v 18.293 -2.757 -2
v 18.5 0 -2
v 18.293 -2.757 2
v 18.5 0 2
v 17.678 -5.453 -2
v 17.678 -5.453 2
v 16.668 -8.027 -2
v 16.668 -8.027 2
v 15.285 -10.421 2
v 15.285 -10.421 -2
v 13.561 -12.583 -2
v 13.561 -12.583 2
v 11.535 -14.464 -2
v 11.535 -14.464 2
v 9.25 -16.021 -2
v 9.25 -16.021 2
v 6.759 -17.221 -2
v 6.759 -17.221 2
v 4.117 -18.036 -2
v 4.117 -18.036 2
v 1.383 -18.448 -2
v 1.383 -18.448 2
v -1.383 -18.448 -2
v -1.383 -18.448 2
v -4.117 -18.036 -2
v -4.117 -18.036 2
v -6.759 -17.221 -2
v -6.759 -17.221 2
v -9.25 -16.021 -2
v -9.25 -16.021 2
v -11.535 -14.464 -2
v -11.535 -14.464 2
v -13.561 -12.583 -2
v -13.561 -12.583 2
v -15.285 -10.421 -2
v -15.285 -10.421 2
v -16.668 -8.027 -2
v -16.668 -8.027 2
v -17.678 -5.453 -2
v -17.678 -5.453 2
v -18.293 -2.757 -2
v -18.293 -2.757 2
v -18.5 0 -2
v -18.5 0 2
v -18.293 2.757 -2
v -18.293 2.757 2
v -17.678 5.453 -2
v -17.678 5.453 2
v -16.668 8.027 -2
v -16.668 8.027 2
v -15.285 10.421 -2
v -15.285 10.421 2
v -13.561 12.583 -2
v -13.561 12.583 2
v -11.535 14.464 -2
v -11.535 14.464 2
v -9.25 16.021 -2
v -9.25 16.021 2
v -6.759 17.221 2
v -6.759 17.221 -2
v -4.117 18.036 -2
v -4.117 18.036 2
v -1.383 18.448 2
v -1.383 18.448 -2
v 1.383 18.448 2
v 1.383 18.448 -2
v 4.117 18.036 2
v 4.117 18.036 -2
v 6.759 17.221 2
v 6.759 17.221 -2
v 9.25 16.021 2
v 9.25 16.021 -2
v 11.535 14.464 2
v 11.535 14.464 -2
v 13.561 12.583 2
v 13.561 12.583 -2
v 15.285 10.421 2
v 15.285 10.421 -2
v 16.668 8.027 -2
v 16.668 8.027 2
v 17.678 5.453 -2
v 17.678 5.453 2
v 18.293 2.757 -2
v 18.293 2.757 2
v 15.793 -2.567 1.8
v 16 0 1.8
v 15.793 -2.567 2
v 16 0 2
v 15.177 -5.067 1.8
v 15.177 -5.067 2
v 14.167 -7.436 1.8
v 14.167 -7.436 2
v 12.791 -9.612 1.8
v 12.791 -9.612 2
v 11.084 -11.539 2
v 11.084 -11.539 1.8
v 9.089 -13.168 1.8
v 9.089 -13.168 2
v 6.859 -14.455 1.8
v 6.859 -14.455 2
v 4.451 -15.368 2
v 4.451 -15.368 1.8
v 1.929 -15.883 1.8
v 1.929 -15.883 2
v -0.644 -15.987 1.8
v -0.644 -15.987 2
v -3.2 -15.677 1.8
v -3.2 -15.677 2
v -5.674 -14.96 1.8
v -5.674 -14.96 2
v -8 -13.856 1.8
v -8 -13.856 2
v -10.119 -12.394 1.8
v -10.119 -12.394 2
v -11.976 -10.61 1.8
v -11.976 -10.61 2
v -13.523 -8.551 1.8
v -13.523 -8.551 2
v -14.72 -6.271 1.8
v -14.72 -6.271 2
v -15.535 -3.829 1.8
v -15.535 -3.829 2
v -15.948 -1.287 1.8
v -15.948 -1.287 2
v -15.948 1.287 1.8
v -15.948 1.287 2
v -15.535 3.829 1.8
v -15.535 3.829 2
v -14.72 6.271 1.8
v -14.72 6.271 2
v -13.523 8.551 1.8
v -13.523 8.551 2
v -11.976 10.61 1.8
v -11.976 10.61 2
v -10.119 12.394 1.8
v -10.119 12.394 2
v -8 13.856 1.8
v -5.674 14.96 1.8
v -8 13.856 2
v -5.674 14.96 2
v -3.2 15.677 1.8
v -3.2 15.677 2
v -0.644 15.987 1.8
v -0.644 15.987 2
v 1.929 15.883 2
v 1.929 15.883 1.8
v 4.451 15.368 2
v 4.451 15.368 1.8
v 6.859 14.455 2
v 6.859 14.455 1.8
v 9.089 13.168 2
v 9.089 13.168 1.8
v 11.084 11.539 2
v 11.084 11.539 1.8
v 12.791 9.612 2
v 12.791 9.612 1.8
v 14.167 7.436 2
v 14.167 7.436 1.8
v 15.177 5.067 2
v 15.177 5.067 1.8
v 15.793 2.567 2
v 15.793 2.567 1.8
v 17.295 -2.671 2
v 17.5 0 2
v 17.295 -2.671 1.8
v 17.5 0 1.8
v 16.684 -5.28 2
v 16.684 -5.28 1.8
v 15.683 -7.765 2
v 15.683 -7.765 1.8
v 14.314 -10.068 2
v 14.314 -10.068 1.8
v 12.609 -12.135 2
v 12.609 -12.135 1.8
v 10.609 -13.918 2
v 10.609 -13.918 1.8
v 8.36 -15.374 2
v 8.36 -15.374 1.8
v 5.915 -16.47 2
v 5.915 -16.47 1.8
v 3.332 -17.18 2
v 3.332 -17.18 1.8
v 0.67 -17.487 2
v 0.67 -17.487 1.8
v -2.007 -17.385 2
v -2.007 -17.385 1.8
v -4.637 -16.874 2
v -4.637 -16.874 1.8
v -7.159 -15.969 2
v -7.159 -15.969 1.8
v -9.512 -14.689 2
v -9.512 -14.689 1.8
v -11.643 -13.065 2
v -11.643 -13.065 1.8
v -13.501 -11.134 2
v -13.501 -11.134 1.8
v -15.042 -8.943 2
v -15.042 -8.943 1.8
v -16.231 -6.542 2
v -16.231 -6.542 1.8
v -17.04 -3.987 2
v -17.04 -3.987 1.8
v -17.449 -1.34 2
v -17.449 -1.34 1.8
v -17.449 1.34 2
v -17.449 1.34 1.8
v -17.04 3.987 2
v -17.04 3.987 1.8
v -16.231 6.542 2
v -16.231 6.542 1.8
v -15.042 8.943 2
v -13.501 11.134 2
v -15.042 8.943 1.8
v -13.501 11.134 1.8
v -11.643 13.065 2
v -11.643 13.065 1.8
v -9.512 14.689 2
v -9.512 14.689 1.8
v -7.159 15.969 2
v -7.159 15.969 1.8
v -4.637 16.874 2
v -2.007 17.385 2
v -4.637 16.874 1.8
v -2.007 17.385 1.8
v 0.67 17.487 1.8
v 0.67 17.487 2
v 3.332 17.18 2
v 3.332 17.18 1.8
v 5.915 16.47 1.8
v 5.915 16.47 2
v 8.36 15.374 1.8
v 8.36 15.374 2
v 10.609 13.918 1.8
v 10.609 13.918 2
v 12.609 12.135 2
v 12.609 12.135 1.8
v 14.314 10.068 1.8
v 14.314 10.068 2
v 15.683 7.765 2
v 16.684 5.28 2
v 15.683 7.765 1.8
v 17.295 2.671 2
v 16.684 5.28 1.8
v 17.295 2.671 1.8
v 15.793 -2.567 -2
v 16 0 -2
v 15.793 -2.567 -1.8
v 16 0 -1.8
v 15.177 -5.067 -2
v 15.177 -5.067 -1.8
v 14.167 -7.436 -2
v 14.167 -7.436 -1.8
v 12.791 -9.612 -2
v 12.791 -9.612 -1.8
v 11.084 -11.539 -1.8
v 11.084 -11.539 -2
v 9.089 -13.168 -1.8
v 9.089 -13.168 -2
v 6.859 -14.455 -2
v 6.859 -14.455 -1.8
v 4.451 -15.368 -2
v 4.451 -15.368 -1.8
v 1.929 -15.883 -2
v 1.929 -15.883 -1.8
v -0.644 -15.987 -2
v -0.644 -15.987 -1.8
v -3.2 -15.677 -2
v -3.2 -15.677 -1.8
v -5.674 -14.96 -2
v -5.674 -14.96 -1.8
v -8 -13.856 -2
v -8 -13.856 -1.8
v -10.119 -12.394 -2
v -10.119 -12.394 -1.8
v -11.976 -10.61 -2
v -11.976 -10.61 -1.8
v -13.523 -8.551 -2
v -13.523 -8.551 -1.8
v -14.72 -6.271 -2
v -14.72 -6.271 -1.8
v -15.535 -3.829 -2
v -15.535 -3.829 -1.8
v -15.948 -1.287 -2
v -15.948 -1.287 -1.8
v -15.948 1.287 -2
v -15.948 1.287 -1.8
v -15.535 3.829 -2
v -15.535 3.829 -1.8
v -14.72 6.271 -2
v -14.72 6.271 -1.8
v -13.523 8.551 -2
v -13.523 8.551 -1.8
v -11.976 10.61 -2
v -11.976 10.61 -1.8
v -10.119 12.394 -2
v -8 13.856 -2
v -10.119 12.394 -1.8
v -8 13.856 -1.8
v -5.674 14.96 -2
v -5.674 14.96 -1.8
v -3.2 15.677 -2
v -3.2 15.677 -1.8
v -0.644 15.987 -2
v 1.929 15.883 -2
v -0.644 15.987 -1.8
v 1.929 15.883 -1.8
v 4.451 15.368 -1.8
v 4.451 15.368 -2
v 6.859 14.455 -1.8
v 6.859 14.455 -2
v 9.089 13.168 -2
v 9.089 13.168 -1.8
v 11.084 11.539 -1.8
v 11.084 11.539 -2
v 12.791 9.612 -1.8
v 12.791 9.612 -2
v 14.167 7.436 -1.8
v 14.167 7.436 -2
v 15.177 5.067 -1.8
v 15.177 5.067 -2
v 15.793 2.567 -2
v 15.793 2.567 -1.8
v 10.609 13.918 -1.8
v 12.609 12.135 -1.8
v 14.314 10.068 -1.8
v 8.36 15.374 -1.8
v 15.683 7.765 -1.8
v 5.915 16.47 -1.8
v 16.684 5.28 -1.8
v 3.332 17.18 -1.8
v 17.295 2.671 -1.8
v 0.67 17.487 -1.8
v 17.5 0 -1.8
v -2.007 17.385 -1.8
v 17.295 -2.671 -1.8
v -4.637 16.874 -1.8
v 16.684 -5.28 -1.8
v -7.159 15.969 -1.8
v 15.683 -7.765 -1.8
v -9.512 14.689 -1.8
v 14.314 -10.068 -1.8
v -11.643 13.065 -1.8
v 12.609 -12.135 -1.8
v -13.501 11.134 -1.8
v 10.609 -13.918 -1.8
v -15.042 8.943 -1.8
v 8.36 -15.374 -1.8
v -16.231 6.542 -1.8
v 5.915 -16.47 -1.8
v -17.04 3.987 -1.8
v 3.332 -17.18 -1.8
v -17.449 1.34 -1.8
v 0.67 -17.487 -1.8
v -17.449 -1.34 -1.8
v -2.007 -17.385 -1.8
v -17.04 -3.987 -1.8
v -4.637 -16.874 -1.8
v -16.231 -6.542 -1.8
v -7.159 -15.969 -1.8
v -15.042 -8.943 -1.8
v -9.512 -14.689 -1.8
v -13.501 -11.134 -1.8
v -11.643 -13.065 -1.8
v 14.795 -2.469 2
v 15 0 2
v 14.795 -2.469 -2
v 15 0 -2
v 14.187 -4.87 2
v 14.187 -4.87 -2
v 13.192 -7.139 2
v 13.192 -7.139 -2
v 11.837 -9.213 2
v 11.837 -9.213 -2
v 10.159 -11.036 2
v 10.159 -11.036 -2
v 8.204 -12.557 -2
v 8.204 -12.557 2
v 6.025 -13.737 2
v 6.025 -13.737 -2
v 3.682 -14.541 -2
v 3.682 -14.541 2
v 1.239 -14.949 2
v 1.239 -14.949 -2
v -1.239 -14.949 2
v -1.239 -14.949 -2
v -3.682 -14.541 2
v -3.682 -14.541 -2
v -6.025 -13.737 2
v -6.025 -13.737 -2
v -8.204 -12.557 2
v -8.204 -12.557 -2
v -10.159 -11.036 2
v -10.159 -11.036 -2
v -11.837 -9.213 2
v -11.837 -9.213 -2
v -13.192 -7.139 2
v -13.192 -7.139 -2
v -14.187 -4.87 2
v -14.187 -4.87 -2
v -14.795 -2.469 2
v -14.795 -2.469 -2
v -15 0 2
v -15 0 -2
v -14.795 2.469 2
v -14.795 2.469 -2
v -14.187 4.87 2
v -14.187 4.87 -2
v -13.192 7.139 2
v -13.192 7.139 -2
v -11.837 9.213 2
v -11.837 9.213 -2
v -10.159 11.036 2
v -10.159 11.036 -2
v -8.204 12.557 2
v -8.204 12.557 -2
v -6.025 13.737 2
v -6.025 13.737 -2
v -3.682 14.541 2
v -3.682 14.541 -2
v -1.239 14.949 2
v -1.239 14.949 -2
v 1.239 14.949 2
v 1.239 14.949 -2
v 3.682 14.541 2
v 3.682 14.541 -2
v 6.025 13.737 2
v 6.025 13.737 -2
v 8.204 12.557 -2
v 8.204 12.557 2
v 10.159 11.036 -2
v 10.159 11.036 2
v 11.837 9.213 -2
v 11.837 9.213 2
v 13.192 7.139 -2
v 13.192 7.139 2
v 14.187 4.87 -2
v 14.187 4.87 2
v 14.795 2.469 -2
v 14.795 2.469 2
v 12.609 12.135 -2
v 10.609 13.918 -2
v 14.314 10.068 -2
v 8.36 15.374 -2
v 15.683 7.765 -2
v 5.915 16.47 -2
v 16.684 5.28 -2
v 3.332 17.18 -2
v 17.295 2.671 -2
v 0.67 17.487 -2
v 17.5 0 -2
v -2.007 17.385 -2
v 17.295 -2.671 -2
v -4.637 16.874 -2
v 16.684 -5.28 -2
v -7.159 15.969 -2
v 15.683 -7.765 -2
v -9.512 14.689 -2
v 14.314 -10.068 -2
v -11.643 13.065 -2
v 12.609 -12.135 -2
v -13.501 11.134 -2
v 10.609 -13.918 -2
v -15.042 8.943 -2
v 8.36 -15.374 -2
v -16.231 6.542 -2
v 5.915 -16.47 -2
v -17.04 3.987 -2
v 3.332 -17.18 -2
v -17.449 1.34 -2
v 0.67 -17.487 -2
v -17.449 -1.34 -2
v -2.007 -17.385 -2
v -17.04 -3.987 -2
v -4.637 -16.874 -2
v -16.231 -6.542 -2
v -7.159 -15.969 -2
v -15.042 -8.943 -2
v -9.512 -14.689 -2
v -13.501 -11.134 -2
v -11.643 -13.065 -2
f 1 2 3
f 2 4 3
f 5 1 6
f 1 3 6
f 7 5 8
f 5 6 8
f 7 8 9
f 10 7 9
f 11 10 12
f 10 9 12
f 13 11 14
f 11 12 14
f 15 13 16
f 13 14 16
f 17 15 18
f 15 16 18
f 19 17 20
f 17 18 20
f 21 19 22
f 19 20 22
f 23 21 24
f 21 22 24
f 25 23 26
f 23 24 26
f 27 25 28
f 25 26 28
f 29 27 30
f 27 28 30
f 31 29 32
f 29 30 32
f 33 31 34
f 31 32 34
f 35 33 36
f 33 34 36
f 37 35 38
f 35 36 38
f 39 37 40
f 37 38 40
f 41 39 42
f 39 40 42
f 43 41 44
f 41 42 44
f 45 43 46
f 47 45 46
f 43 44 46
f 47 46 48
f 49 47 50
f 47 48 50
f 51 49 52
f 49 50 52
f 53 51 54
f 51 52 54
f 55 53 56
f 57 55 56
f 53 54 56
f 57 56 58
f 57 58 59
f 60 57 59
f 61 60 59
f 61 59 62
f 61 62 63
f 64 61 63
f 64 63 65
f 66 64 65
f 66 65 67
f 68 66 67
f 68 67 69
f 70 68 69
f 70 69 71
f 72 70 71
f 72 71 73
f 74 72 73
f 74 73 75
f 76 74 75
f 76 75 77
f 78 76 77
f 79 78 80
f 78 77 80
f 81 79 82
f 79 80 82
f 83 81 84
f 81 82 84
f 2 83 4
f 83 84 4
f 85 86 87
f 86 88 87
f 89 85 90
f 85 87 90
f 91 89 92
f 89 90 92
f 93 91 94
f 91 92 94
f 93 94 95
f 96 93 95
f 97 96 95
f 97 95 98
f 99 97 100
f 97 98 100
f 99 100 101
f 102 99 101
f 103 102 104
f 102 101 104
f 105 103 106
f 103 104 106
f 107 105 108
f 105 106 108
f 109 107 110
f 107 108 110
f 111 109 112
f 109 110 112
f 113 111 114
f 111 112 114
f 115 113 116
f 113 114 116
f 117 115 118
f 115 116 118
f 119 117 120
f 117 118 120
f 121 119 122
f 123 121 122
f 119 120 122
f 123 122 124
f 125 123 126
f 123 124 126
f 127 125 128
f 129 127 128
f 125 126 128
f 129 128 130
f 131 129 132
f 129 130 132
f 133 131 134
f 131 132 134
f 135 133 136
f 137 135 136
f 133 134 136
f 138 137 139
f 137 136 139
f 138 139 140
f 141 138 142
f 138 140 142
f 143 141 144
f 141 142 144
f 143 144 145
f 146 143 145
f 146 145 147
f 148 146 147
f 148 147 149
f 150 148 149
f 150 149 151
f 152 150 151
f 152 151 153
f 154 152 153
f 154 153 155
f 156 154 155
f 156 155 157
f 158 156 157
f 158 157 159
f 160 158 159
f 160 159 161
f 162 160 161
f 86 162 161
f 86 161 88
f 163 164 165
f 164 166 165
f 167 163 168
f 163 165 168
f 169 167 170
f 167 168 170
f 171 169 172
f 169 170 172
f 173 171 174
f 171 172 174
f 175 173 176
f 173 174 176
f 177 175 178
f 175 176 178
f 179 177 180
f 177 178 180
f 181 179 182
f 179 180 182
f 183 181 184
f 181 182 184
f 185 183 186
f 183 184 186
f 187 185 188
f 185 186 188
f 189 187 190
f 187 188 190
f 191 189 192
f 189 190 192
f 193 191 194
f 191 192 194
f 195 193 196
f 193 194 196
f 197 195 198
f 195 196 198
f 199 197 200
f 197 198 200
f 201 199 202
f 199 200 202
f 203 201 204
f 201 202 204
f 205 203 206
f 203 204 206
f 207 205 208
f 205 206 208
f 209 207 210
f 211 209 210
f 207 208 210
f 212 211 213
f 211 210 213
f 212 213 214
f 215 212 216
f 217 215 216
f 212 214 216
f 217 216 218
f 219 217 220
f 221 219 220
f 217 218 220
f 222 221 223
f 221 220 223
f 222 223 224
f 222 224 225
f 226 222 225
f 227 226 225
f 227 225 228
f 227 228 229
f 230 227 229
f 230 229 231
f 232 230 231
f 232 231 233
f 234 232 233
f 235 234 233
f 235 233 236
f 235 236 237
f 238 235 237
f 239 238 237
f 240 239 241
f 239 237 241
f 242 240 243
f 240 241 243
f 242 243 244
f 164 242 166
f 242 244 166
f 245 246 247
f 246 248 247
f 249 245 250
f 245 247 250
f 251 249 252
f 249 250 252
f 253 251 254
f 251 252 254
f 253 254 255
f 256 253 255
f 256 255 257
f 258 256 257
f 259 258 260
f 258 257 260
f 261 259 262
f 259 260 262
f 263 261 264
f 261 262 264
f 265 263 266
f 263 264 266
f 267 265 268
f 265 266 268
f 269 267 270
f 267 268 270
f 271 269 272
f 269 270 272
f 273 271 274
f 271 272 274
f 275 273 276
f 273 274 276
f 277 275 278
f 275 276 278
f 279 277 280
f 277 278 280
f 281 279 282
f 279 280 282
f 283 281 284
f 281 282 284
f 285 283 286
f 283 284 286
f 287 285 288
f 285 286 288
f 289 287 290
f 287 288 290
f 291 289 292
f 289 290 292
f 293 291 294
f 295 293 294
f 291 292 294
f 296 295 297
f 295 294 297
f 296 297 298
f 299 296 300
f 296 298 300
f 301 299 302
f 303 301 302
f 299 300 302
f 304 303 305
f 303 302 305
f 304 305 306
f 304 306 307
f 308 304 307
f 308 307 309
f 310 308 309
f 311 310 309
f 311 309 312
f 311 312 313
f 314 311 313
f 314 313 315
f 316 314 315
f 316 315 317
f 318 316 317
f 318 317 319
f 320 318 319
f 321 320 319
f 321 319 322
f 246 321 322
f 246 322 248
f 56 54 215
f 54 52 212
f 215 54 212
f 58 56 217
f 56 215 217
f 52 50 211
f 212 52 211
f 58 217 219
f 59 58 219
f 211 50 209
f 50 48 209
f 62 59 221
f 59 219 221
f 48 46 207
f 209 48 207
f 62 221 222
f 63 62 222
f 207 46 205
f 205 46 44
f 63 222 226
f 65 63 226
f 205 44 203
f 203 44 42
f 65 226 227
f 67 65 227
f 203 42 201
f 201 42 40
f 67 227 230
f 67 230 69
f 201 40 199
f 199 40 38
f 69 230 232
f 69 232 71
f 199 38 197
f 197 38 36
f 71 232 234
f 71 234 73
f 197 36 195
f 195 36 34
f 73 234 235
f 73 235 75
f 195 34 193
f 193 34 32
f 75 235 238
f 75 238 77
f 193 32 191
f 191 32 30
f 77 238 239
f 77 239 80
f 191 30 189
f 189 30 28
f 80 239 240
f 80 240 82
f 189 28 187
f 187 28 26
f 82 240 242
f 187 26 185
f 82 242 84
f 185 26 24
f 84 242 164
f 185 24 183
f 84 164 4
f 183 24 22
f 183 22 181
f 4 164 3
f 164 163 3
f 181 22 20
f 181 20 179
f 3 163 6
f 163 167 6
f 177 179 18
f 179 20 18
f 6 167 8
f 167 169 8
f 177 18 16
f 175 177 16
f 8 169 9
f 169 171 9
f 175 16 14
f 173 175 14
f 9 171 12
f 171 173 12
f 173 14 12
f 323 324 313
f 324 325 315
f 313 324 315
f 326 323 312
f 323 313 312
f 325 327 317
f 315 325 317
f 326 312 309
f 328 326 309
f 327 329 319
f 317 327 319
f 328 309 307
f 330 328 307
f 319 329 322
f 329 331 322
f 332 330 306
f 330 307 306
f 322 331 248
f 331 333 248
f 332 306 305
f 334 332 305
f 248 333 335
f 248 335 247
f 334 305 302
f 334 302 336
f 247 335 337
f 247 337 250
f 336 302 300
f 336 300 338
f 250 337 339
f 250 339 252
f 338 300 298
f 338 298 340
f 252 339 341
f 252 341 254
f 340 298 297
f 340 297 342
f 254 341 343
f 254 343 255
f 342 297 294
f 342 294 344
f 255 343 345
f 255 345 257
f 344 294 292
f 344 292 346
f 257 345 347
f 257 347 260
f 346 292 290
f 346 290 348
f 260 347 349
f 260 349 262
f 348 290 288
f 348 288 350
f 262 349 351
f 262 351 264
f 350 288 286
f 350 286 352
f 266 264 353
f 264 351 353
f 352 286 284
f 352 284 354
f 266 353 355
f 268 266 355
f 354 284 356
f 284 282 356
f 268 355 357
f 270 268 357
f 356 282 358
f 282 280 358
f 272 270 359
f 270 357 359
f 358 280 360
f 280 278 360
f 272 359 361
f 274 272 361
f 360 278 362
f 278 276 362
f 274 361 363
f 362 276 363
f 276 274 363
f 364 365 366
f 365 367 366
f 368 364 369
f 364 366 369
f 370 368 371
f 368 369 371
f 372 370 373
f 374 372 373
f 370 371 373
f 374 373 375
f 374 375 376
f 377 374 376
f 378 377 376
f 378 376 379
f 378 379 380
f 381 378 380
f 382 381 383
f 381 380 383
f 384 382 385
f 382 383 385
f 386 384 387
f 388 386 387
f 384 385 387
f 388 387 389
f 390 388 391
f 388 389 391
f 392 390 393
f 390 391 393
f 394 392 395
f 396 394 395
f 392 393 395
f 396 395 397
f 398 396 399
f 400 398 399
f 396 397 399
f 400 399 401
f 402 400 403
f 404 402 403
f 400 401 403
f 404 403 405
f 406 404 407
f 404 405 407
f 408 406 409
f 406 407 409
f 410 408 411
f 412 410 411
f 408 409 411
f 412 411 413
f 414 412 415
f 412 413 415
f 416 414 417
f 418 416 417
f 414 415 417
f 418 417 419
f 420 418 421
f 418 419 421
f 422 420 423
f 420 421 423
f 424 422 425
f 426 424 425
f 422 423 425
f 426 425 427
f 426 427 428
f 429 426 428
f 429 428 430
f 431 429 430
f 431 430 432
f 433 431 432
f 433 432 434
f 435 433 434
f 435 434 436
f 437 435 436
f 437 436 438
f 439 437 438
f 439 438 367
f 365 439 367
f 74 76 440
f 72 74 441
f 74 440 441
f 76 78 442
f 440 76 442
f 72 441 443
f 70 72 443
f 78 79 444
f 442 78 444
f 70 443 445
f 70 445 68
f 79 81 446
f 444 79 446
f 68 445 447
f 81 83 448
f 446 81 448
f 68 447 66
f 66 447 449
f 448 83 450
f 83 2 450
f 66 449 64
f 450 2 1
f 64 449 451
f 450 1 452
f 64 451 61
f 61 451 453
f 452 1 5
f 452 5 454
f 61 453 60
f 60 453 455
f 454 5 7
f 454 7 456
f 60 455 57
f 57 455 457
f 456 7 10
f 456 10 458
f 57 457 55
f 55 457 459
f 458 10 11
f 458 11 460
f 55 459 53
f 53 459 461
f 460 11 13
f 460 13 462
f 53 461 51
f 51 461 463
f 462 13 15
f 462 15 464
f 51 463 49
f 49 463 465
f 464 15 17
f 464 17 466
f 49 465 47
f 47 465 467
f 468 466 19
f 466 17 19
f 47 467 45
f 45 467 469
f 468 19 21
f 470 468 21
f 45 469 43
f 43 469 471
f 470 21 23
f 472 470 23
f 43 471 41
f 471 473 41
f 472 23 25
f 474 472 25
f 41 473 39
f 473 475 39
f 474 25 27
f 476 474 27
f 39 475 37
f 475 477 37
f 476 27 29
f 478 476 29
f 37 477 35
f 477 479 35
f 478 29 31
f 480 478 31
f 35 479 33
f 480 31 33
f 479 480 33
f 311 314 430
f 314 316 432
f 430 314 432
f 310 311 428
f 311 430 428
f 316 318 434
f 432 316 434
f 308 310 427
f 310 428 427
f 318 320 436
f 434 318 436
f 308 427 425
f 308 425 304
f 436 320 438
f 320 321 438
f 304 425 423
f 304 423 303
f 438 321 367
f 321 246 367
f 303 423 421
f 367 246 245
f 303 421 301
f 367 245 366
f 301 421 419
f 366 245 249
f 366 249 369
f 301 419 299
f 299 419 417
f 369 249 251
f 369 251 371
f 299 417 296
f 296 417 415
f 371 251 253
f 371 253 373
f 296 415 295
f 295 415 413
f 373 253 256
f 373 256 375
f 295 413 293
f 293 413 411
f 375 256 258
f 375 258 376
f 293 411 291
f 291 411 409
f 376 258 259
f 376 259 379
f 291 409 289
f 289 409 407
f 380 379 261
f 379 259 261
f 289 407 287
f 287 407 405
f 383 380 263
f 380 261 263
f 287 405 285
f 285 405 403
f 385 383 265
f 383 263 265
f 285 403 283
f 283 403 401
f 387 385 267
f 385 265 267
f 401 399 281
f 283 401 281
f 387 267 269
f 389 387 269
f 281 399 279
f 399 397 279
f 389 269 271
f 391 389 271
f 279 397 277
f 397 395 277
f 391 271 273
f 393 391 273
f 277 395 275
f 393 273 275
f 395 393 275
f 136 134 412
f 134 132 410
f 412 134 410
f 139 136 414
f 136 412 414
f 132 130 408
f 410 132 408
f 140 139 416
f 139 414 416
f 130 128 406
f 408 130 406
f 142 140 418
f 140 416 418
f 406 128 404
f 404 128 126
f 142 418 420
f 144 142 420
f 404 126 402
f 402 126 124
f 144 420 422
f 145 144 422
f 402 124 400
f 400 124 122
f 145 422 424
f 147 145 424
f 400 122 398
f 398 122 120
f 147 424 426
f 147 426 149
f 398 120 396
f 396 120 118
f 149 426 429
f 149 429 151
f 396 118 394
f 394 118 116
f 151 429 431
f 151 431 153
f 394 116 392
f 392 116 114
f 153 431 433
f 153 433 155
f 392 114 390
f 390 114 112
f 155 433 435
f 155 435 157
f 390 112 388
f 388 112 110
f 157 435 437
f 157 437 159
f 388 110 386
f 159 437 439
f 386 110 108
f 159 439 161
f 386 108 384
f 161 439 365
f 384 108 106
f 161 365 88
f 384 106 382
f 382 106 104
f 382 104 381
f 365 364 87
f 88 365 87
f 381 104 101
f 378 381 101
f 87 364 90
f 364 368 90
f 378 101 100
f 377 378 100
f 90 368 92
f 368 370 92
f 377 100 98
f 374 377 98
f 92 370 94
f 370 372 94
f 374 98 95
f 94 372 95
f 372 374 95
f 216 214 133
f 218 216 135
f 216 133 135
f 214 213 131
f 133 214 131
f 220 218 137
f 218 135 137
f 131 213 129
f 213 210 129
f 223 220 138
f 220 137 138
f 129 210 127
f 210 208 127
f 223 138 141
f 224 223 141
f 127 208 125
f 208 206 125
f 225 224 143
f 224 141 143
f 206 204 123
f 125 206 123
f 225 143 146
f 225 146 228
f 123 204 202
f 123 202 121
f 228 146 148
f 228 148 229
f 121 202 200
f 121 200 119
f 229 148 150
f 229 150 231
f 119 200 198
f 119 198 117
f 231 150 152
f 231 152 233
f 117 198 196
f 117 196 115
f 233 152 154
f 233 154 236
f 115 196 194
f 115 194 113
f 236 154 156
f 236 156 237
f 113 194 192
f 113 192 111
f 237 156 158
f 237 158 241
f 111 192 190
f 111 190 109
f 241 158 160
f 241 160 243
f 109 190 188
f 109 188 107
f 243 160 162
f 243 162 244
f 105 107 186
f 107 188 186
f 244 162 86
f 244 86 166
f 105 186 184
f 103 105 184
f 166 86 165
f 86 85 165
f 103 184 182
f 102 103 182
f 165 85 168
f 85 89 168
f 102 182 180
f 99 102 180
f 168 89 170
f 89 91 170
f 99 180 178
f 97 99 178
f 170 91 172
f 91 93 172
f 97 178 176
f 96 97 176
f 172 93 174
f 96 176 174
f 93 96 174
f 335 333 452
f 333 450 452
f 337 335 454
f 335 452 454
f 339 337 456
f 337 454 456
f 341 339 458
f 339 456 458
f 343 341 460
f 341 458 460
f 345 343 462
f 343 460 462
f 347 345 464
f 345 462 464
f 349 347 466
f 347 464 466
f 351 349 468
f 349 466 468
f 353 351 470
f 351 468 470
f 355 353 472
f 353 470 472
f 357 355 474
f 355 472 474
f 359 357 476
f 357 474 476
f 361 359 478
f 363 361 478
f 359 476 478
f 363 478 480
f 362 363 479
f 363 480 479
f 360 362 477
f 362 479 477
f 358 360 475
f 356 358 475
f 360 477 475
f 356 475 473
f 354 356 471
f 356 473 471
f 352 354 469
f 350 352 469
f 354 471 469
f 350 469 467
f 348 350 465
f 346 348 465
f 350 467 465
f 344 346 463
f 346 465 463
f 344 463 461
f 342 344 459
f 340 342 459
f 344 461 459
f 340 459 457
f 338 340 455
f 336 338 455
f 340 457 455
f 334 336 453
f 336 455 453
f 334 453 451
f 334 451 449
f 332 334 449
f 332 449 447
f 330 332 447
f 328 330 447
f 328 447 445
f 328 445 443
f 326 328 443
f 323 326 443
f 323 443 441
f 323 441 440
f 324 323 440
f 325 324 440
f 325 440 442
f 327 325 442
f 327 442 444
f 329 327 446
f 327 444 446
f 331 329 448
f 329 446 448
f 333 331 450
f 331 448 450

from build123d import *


with BuildPart() as part:
    # 草图2 → 旋转1 (revolve)
    with BuildSketch(Plane(origin=(0, 0, 0), x_dir=(1, 0, 0), z_dir=(0, 1, 0))):
        Polygon((16, 2), (16, 1.8), (17.5, 1.8), (17.5, 2), (18.5, 2), (18.5, -2), (17.5, -2), (17.5, -1.8), (16, -1.8), (16, -2), (15, -2), (15, 2), align=None)
    revolve(axis=Axis((0, 0, 426.054329645), (0, 0, -1)))


solid = part.part
